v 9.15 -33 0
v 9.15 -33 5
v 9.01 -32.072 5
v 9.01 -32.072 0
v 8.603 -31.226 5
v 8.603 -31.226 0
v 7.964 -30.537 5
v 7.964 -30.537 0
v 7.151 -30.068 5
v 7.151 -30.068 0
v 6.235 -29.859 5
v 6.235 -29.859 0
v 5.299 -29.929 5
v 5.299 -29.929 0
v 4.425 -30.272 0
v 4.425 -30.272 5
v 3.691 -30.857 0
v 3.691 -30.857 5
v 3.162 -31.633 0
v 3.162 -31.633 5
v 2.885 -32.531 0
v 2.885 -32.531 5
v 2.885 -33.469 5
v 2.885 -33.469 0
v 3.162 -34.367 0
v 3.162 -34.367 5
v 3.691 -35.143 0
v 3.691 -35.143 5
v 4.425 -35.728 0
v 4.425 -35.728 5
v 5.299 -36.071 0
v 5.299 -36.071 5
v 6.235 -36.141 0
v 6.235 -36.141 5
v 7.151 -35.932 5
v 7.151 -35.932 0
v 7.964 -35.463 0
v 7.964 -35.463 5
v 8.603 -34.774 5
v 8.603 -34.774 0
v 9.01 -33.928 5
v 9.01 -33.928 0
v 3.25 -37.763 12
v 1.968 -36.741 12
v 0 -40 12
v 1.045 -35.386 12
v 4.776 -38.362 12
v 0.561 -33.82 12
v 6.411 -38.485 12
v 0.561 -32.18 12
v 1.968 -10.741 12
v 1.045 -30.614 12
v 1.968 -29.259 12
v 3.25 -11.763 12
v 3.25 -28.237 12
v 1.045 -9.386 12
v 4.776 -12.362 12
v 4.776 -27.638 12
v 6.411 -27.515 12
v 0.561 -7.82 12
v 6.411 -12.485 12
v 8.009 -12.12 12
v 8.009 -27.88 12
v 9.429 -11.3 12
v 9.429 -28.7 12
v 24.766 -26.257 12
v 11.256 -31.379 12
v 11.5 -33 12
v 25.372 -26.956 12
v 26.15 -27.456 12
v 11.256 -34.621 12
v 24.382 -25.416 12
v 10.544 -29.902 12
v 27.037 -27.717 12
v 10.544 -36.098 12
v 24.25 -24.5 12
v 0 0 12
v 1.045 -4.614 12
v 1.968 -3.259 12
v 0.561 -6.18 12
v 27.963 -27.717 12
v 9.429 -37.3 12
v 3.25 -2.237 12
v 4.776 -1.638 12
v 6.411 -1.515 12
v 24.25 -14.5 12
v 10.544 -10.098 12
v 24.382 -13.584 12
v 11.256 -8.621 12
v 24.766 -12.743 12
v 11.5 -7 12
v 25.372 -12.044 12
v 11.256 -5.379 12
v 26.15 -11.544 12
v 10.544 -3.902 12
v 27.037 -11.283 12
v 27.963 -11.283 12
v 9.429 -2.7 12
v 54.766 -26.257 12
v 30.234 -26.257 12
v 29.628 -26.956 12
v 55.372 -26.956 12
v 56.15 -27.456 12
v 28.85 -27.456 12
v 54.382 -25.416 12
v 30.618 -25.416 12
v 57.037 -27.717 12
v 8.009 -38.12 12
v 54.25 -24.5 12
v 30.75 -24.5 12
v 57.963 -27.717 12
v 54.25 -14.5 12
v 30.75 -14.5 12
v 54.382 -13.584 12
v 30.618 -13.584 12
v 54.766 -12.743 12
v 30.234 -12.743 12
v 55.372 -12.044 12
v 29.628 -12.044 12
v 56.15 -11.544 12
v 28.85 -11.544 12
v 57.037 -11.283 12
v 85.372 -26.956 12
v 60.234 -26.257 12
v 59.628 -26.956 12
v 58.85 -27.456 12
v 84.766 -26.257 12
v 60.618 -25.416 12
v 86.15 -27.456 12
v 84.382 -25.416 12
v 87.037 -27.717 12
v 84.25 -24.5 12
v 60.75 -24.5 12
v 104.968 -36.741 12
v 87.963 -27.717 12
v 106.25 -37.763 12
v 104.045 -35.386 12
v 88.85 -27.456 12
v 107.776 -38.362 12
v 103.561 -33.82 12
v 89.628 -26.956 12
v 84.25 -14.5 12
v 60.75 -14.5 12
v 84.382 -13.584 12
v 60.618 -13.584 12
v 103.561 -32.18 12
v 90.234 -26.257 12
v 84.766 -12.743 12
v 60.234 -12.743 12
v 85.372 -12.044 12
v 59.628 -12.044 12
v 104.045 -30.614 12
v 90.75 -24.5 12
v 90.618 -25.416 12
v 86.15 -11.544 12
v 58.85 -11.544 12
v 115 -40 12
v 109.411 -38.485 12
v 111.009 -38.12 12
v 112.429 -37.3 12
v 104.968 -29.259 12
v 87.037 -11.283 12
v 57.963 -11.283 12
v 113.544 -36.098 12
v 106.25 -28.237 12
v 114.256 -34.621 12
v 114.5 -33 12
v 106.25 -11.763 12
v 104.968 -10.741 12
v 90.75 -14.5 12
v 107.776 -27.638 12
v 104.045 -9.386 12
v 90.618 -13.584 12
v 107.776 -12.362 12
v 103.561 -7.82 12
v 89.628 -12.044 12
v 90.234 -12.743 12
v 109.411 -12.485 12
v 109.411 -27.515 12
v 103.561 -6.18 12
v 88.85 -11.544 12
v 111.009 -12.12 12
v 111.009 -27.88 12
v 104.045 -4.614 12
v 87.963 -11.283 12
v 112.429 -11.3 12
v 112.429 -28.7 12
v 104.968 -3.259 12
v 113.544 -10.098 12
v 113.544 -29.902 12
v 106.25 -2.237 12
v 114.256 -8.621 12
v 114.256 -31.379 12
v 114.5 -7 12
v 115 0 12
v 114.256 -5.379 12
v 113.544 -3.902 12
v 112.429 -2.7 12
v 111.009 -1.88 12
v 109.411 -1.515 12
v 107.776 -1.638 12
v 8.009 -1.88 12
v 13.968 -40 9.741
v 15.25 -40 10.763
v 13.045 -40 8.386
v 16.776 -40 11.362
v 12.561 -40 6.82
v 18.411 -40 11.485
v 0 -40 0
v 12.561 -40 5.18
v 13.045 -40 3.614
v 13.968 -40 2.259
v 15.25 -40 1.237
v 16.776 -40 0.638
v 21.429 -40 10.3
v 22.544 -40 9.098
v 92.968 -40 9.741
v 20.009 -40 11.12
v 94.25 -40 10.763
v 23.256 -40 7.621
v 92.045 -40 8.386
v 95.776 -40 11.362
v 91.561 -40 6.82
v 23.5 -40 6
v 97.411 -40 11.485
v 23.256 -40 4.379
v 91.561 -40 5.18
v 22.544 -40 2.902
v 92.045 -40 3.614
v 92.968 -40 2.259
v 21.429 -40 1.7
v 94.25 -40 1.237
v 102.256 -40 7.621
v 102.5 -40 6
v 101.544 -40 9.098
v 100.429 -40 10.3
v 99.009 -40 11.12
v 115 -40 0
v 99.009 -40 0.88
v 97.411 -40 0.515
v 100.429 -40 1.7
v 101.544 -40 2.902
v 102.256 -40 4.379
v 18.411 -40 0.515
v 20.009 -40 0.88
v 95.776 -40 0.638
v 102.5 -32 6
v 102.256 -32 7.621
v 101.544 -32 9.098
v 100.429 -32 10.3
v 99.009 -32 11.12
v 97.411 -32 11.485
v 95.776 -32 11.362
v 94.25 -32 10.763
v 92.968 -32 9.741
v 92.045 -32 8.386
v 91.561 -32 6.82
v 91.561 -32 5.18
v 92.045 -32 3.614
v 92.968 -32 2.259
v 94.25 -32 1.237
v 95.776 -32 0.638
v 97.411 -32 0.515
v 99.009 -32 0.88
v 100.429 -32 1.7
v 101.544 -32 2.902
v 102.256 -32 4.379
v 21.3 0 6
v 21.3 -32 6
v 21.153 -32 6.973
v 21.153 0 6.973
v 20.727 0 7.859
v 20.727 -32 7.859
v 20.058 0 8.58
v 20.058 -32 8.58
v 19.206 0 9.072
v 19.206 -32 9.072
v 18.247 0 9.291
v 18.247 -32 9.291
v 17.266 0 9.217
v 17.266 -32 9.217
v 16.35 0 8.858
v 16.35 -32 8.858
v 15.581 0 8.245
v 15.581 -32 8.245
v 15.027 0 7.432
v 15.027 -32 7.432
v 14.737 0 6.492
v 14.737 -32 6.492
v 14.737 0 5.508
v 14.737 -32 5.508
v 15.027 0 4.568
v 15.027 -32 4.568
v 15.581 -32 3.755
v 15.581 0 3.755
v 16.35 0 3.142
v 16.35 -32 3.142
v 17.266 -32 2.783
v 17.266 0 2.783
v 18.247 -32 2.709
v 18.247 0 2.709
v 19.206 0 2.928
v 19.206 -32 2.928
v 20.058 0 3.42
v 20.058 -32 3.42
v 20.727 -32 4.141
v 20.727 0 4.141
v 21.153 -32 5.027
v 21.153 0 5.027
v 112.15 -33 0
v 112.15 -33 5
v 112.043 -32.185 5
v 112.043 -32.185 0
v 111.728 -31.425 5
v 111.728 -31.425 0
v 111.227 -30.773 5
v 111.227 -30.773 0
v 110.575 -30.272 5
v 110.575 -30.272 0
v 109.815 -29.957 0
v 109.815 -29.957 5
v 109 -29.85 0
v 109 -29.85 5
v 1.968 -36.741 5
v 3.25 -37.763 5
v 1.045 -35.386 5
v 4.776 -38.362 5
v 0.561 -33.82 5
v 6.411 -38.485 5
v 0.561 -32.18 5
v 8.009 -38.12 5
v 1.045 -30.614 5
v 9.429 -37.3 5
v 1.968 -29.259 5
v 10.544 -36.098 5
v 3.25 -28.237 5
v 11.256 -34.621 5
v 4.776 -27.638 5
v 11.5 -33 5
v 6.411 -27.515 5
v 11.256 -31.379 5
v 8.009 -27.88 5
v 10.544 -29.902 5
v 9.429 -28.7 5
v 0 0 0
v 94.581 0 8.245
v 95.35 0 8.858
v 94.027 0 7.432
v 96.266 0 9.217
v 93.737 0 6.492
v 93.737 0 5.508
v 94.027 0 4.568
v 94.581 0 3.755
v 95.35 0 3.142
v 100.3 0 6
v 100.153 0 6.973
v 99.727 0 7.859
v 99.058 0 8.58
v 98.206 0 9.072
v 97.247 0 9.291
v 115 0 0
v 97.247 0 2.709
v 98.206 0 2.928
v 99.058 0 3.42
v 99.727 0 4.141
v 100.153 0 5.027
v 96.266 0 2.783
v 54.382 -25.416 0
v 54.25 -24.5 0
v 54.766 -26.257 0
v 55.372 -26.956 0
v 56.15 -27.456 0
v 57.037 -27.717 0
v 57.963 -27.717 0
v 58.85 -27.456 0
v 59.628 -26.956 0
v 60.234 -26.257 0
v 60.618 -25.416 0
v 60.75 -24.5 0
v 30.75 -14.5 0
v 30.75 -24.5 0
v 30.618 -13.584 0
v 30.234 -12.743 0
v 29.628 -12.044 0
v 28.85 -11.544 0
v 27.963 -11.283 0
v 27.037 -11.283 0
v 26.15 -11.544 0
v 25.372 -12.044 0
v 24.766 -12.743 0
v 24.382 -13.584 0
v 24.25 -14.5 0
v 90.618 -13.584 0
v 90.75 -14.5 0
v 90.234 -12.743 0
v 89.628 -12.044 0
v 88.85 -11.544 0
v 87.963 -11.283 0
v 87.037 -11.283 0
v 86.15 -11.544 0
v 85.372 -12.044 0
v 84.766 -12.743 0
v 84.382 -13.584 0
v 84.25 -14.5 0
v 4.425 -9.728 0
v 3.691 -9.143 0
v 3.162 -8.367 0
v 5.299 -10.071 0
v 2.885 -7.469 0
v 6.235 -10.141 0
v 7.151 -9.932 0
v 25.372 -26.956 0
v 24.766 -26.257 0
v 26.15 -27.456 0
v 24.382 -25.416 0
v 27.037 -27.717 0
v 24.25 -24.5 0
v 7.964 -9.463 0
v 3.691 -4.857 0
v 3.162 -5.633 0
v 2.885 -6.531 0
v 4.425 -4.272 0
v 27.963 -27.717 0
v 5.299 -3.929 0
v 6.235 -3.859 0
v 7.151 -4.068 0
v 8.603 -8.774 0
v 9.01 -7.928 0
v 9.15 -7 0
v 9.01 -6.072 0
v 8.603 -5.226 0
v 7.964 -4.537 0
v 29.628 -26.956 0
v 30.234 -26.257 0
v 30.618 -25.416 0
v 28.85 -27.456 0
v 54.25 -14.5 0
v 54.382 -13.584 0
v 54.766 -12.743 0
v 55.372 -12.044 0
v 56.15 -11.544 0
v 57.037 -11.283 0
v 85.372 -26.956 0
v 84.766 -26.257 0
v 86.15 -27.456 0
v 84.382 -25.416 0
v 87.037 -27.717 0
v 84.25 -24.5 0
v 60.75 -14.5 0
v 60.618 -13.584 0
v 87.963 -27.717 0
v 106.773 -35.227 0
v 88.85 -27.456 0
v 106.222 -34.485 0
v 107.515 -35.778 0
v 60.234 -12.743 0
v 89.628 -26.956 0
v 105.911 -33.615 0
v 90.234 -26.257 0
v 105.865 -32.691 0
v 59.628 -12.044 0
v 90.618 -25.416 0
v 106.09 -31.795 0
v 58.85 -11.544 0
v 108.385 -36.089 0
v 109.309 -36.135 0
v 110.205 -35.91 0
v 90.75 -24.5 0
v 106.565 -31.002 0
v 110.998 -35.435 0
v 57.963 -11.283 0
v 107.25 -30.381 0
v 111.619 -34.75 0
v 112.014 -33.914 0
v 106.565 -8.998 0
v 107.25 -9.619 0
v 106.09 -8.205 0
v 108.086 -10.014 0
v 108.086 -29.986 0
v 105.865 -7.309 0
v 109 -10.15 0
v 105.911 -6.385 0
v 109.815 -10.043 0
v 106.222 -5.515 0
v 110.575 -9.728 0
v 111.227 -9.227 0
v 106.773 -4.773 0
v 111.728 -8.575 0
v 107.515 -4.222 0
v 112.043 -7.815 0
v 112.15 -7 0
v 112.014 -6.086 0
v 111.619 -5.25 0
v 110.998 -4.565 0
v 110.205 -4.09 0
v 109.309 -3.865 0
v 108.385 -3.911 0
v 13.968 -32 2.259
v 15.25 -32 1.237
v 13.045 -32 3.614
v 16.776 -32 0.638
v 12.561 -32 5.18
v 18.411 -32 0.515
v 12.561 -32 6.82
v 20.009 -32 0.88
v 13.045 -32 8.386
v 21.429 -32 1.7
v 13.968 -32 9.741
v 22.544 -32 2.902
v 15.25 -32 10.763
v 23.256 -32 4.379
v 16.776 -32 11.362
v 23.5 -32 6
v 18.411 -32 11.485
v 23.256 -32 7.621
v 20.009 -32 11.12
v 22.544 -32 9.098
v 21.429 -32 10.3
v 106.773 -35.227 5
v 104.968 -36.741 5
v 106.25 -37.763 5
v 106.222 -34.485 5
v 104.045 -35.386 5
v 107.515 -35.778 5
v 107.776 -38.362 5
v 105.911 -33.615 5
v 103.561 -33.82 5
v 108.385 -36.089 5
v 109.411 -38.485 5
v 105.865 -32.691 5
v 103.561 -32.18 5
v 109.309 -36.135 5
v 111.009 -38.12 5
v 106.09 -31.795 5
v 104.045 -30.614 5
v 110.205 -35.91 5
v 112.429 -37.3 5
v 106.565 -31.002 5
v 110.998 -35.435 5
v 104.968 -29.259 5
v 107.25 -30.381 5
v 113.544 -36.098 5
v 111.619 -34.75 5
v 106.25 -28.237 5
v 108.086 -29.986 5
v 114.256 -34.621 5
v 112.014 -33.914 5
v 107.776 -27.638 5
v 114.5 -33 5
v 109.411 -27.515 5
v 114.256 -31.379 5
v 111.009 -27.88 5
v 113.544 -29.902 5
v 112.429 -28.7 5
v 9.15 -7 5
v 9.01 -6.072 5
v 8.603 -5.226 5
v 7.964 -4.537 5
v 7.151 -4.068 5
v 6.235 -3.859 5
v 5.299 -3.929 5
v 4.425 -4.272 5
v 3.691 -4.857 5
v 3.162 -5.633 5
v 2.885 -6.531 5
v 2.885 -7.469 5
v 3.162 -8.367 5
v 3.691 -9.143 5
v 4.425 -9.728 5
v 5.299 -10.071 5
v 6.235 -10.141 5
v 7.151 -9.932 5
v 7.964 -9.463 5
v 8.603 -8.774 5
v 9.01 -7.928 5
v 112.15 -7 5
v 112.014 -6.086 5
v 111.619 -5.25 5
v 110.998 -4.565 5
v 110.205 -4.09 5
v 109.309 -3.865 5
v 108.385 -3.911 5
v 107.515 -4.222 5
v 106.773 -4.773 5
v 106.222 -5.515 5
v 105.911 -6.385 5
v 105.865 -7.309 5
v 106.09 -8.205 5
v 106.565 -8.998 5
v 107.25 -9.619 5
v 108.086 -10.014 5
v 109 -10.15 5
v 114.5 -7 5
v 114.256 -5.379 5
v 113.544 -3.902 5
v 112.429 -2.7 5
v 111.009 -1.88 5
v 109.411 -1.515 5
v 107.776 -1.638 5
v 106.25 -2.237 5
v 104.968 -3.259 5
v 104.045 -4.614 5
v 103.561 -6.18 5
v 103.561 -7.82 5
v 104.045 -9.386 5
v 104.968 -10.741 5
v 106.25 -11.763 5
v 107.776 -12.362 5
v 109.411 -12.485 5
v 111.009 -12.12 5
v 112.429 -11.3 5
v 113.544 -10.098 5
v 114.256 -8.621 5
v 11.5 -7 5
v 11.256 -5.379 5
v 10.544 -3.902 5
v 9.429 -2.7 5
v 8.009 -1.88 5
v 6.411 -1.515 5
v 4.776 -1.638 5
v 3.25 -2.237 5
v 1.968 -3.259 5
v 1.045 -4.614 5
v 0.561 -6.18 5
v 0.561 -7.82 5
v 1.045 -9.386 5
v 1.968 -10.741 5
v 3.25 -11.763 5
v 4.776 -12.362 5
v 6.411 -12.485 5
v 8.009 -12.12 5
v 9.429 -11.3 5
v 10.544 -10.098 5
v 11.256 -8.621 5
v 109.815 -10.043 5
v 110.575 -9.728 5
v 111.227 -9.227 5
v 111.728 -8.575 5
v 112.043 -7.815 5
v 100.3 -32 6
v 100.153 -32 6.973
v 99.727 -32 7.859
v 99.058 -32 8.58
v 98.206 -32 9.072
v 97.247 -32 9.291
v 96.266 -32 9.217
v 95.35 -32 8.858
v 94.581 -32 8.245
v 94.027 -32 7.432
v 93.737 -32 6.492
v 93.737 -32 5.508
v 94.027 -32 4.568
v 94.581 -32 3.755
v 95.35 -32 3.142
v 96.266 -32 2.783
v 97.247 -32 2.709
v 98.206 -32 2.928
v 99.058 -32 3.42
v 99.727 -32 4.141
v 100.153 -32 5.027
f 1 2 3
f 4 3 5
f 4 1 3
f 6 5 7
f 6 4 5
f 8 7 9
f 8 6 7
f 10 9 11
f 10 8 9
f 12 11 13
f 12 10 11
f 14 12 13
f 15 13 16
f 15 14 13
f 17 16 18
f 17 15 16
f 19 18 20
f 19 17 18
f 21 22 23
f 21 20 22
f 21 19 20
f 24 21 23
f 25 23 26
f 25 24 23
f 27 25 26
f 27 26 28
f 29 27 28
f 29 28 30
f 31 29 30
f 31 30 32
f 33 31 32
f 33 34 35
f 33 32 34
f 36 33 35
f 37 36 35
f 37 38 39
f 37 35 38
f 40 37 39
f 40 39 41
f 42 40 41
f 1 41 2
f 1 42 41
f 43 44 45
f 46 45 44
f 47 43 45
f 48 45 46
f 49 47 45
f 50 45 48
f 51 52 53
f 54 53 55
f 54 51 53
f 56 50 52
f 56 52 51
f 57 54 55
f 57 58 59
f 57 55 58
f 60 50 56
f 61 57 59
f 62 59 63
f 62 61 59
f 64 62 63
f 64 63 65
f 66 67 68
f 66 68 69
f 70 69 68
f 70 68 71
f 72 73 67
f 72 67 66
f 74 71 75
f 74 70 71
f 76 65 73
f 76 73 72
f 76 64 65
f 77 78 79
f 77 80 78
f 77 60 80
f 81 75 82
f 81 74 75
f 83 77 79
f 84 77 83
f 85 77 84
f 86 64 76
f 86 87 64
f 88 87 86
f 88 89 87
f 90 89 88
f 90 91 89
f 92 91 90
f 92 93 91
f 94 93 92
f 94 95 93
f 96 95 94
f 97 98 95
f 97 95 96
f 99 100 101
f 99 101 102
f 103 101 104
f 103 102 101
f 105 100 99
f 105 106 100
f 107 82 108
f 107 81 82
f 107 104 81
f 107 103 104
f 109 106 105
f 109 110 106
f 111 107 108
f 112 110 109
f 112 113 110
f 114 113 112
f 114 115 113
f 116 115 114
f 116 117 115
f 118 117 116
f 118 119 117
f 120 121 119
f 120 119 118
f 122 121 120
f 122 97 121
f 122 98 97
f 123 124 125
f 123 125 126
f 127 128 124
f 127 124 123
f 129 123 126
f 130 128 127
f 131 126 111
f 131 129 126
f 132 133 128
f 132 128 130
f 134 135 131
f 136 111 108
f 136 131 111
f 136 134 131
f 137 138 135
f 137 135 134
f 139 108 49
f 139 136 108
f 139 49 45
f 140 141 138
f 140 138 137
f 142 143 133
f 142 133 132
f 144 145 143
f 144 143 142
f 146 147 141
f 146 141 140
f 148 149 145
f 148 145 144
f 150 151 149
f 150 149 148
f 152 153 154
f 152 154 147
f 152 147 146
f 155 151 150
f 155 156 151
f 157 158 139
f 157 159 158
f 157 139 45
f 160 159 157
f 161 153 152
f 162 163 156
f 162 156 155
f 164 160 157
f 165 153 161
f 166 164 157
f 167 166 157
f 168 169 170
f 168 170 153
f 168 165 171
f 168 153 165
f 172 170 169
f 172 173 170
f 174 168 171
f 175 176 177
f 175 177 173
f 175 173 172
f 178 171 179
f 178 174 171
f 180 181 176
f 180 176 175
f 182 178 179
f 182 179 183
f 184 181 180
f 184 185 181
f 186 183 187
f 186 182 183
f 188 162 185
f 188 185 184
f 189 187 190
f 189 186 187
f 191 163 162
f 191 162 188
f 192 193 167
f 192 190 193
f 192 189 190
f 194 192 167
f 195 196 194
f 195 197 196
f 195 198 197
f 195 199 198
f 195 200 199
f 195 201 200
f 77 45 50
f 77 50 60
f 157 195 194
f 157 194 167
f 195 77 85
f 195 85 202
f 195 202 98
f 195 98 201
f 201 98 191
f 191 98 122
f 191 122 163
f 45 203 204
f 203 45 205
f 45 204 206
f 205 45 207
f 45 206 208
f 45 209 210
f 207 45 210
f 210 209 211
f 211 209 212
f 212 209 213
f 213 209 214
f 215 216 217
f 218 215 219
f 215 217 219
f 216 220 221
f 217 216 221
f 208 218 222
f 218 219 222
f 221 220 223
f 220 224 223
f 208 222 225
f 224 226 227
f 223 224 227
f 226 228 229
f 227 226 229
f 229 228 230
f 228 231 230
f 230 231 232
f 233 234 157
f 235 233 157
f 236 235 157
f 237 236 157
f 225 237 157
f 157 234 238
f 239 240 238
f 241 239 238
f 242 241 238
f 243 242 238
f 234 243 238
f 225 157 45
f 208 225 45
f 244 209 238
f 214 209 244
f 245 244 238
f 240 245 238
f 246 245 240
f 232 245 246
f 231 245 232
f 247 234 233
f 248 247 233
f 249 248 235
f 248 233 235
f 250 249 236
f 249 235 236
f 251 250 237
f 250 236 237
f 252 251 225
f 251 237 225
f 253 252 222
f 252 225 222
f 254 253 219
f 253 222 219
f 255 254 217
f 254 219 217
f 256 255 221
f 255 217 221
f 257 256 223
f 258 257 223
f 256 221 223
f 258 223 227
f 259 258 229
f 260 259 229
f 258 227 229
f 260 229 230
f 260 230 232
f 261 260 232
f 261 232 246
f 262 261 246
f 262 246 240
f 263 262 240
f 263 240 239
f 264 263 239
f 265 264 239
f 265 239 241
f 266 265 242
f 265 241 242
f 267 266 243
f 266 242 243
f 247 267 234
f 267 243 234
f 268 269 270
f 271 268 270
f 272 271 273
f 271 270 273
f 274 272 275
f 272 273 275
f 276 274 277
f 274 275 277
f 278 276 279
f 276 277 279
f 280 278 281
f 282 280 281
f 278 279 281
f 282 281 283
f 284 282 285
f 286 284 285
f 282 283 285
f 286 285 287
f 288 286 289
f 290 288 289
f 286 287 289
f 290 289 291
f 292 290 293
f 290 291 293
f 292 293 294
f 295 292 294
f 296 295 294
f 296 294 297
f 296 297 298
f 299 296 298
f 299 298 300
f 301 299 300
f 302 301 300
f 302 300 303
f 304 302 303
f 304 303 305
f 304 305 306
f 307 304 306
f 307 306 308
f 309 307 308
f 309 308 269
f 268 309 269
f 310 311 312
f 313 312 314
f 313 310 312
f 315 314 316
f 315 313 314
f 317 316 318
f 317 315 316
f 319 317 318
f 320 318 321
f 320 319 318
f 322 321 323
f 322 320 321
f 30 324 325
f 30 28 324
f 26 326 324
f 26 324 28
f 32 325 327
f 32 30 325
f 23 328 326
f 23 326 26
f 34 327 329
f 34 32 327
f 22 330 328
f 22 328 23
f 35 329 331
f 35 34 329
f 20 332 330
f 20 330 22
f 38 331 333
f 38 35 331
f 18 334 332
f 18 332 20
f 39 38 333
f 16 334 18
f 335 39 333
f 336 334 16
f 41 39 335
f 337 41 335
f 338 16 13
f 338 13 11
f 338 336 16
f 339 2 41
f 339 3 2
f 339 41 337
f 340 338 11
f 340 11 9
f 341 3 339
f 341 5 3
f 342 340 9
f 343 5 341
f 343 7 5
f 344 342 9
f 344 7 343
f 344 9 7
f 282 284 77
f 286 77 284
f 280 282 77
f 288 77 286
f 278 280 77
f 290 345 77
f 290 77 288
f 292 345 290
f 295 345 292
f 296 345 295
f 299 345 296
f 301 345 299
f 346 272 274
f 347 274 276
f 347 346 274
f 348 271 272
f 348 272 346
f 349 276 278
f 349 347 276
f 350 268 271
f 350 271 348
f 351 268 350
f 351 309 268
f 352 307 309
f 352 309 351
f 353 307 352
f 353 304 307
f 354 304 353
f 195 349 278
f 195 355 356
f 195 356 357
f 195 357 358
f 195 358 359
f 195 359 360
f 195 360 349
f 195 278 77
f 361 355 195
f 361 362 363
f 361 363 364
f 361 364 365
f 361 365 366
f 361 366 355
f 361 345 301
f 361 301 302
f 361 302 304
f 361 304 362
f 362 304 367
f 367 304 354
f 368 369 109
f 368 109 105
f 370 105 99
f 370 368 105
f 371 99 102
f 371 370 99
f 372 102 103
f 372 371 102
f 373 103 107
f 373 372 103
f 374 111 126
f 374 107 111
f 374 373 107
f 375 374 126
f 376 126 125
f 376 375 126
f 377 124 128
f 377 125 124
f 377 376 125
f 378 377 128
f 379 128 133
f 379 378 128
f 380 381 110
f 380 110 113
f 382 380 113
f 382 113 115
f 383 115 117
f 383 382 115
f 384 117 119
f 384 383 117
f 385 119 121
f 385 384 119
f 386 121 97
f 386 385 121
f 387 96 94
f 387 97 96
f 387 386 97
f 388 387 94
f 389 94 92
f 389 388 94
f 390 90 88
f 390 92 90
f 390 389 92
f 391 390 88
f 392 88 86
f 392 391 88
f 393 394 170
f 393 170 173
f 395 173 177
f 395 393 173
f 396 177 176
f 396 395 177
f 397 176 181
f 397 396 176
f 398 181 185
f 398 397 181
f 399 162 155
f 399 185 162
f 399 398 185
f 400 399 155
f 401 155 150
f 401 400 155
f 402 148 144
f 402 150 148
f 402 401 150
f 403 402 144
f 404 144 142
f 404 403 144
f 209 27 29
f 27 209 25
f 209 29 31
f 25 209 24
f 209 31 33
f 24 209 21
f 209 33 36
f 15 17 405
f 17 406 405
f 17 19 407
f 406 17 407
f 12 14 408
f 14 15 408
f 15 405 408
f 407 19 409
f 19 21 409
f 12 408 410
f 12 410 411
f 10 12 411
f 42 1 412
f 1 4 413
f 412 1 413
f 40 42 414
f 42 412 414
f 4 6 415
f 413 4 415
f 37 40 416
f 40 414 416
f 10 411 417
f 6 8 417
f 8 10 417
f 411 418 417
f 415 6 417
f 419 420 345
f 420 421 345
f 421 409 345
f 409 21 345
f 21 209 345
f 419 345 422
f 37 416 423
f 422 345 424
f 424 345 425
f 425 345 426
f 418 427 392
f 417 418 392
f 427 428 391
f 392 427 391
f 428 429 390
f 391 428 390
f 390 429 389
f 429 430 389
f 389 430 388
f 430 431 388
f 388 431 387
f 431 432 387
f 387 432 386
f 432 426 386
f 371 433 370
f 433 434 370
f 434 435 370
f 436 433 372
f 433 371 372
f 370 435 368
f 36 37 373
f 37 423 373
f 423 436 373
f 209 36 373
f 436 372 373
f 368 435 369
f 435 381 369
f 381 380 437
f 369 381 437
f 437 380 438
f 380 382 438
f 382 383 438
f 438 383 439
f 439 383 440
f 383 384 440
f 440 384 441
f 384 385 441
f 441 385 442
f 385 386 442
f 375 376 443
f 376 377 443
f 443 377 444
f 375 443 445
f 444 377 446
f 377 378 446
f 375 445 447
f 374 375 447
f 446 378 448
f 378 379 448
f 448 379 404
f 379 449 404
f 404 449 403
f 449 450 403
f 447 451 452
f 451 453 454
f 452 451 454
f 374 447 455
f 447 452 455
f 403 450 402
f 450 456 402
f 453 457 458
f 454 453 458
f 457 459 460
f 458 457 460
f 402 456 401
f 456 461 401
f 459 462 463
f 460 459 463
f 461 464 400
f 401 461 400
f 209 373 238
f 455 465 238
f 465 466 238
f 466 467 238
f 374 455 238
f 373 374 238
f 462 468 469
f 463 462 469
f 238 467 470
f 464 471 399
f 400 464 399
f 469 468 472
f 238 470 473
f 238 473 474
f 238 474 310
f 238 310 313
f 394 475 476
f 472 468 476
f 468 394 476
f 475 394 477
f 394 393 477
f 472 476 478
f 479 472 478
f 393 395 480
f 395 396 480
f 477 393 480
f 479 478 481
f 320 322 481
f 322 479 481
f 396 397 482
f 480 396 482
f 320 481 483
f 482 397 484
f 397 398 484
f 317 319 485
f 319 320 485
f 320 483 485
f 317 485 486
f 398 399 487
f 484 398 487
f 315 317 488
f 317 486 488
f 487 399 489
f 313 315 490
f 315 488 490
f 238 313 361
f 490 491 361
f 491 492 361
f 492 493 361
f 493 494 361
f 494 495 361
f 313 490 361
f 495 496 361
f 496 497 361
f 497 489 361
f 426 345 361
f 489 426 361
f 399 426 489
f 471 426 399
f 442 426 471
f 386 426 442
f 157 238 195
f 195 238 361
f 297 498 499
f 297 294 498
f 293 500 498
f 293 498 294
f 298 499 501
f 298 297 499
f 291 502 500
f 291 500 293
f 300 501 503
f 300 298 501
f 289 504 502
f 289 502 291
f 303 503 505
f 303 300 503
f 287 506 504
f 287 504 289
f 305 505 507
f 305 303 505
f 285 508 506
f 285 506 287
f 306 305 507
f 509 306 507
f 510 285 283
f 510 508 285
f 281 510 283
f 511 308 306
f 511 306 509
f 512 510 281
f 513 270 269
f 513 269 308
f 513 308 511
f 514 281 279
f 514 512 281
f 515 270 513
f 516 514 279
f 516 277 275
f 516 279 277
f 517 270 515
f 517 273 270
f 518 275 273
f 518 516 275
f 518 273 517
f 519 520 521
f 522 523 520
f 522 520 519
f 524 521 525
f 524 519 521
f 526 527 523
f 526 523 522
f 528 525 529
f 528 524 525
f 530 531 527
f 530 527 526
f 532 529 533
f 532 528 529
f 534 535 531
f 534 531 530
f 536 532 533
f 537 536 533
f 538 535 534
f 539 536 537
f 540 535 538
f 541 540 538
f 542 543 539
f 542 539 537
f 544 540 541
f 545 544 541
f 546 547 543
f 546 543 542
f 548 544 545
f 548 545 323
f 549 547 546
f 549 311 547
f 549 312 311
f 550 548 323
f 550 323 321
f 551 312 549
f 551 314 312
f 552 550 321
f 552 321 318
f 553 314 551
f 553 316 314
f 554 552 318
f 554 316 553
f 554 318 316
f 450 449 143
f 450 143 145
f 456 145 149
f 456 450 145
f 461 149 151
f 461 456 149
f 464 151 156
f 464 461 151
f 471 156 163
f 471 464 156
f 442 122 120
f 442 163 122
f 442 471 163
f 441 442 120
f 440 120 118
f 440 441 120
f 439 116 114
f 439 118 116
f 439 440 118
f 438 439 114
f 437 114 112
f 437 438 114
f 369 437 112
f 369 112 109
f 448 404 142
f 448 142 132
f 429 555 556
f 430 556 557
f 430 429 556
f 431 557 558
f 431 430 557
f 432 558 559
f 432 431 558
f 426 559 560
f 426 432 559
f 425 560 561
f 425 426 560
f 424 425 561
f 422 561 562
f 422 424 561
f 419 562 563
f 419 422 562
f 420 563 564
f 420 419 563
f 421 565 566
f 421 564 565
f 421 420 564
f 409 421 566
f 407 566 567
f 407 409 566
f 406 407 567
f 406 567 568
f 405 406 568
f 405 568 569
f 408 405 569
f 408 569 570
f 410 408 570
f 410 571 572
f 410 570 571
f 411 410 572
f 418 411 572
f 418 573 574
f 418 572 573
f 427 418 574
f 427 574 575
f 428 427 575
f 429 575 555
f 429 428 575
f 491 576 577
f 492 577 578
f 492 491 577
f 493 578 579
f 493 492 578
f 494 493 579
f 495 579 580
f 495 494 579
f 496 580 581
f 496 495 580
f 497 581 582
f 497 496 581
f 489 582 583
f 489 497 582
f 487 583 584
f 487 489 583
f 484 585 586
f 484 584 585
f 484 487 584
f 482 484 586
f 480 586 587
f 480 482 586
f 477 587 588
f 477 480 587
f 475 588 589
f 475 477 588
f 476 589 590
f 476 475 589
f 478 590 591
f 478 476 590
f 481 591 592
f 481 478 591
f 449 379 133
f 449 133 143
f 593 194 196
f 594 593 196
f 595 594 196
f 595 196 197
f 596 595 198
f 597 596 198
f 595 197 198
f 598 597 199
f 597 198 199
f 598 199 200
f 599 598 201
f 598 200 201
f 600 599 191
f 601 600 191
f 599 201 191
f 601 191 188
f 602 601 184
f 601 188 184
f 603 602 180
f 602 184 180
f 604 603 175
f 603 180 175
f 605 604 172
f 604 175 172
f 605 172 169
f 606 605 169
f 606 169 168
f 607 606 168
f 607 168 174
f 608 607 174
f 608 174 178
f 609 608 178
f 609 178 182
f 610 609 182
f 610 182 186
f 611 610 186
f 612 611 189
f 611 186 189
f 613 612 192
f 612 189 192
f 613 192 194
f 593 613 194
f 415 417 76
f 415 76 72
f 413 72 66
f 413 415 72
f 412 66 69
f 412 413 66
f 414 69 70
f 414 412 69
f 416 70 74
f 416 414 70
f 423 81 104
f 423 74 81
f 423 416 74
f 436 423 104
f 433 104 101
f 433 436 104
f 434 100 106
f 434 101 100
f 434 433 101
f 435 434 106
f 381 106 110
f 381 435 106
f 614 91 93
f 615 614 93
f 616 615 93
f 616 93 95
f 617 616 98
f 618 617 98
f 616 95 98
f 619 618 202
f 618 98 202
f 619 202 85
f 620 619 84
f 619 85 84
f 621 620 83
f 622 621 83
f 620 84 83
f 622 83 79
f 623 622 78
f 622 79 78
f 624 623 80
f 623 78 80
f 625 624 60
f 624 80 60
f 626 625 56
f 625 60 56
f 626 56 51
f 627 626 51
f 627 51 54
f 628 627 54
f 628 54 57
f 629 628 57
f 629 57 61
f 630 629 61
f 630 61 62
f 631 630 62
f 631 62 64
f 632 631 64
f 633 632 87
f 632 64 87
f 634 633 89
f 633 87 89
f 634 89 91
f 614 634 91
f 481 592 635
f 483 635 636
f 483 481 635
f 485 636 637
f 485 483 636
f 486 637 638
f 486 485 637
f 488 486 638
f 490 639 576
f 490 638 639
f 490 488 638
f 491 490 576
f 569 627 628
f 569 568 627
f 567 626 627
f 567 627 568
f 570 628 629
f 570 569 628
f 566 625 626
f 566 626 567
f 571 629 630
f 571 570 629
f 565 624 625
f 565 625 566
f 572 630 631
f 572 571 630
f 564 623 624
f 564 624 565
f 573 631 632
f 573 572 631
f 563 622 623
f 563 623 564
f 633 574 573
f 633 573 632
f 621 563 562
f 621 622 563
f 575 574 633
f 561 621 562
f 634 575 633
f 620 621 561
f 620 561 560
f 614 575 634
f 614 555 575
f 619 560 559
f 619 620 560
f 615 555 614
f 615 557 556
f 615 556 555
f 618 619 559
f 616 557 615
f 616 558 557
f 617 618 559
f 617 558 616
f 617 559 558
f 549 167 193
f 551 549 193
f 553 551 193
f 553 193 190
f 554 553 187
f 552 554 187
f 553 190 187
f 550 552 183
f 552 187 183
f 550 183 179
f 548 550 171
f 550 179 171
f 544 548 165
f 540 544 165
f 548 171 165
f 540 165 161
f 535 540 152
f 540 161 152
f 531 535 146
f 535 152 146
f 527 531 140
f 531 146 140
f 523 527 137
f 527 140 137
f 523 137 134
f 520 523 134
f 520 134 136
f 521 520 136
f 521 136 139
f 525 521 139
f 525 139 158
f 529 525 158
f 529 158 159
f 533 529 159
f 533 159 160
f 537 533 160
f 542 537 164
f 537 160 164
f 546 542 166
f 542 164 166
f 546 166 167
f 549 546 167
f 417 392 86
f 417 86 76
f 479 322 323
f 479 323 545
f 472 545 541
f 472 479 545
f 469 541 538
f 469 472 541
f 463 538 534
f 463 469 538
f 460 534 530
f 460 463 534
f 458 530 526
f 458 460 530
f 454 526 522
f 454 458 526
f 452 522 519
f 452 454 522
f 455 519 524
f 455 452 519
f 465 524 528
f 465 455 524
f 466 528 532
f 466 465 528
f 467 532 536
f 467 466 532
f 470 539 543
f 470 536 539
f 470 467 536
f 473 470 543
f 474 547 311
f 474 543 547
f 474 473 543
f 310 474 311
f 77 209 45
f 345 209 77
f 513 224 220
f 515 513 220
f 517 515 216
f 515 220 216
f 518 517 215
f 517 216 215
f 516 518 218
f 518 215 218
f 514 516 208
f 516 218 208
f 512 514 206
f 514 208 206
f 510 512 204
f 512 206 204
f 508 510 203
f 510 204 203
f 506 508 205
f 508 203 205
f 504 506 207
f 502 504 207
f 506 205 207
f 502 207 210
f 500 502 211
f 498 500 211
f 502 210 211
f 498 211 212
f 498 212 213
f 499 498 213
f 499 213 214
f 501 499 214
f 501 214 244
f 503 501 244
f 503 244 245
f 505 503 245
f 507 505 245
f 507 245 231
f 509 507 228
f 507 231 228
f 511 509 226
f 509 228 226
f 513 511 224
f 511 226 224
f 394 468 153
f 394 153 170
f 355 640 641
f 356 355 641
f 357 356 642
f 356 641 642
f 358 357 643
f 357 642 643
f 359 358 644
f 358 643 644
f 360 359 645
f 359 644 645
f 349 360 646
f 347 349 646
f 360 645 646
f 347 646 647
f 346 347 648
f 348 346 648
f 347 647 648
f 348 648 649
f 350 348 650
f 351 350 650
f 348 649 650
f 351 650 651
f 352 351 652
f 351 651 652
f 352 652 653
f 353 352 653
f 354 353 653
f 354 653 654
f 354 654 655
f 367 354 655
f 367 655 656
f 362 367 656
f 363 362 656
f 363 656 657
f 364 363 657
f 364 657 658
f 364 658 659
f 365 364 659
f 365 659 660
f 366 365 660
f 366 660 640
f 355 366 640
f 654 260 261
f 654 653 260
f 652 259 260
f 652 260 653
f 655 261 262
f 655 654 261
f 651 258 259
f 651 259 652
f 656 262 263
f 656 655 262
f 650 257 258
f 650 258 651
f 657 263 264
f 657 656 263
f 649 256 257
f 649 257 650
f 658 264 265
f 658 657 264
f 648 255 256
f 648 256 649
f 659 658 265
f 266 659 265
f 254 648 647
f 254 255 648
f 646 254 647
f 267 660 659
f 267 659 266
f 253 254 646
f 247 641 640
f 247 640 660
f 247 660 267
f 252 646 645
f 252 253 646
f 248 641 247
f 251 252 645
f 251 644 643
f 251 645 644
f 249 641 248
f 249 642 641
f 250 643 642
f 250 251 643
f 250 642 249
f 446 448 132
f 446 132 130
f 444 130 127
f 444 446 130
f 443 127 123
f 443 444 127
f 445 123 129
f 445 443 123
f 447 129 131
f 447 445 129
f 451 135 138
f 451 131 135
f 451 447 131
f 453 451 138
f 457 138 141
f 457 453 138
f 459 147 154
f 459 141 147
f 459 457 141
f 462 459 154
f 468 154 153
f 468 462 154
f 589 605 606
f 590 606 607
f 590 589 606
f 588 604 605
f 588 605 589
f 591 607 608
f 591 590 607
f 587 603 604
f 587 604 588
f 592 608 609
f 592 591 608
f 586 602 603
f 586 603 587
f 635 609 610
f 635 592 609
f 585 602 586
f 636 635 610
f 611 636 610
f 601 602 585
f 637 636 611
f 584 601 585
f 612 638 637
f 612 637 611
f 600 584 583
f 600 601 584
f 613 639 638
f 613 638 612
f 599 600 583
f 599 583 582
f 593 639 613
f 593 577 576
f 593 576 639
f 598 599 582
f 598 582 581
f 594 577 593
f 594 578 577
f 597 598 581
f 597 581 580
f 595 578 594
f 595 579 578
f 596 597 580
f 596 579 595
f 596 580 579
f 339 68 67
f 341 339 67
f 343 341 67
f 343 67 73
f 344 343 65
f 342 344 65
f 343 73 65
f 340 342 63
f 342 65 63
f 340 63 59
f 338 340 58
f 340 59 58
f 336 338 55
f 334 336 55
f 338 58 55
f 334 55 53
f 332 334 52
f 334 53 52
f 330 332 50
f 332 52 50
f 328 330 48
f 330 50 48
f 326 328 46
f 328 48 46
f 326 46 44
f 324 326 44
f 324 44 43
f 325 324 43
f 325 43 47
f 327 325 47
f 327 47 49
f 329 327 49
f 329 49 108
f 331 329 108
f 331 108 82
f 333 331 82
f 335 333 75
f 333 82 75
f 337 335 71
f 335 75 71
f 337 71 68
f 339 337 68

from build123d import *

# Parameters (mm, degrees)
F0_W      = 115
F0_H      = 40
F1_DEPTH  = 12
F3_DEPTH  = 12.1
F4_R      = 3.15
F5_DEPTH  = 12.1
F6_R      = 5.5
F7_DEPTH  = 7
F8_R      = 3.3
F9_DEPTH  = 40.1
F10_R     = 5.5
F11_DEPTH = 8


with BuildPart() as f1:
    # F0 (on Top) → F1 (new body)
    with BuildSketch(Plane.XY):
        with Locations((57.5, -20)):
            Rectangle(F0_W, F0_H)
    extrude(amount=F1_DEPTH)

    # F2 (on Top) → F3 (cut)
    with BuildSketch(Plane.XY):
        with BuildLine():
            Line((30.75, -24.5), (30.75, -14.5))
            ThreePointArc((30.75, -14.5), (27.5, -11.25), (24.25, -14.5))
            Line((24.25, -14.5), (24.25, -24.5))
            ThreePointArc((24.25, -24.5), (27.5, -27.75), (30.75, -24.5))
        make_face()
        with BuildLine():
            ThreePointArc((60.75, -14.5), (57.5, -11.25), (54.25, -14.5))
            Line((54.25, -14.5), (54.25, -24.5))
            ThreePointArc((54.25, -24.5), (57.5, -27.75), (60.75, -24.5))
            Line((60.75, -24.5), (60.75, -14.5))
        make_face()
        with BuildLine():
            ThreePointArc((90.75, -14.5), (87.5, -11.25), (84.25, -14.5))
            Line((84.25, -14.5), (84.25, -24.5))
            ThreePointArc((84.25, -24.5), (87.5, -27.75), (90.75, -24.5))
            Line((90.75, -24.5), (90.75, -14.5))
        make_face()
    extrude(amount=F3_DEPTH, mode=Mode.SUBTRACT)

    # F4 (on Top) → F5 (cut)
    with BuildSketch(Plane.XY):
        with Locations((6, -7)):
            Circle(F4_R)
        with Locations((6, -33)):
            Circle(F4_R)
        with BuildLine():
            ThreePointArc((109, -10.15), (111.227386, -9.227386), (112.15, -7))
            ThreePointArc((112.15, -7), (106.772614, -4.772614), (109, -10.15))
        make_face()
        with BuildLine():
            ThreePointArc((112.15, -33), (111.227386, -30.772614), (109, -29.85))
            ThreePointArc((109, -29.85), (106.772614, -35.227386), (112.15, -33))
        make_face()
    extrude(amount=F5_DEPTH, mode=Mode.SUBTRACT)

    # F6 (on face) → F7 (cut)
    with BuildSketch(Plane.XY.offset(12)):
        with Locations((6, -7)):
            Circle(F6_R)
        with Locations((6, -33)):
            Circle(F6_R)
        with Locations((109, -7)):
            Circle(F6_R)
        with Locations((109, -33)):
            Circle(F6_R)
    extrude(amount=-F7_DEPTH, mode=Mode.SUBTRACT)

    # F8 (on face) → F9 (cut)
    with BuildSketch(Plane.XZ.offset(40)):
        with Locations((97, 6)):
            Circle(F8_R)
        with Locations((18, 6)):
            Circle(F8_R)
    extrude(amount=-F9_DEPTH, mode=Mode.SUBTRACT)

    # F10 (on face) → F11 (cut)
    with BuildSketch(Plane.XZ.offset(40)):
        with Locations((18, 6)):
            Circle(F10_R)
        with Locations((97, 6)):
            Circle(F10_R)
    extrude(amount=-F11_DEPTH, mode=Mode.SUBTRACT)


solid = f1.part
